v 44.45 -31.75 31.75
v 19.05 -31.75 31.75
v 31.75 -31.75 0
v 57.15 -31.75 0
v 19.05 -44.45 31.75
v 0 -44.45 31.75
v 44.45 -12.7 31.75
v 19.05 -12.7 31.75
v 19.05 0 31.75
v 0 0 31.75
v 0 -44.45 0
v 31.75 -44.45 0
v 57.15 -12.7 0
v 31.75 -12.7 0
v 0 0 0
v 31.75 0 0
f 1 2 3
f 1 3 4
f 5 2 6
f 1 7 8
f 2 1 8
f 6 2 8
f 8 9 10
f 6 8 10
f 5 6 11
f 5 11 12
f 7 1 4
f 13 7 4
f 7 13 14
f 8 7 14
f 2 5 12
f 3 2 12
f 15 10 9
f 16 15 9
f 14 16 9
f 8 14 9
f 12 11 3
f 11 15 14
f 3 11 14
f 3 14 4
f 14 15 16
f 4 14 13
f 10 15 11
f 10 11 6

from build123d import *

# Parameters (mm, degrees)
F0_W      = 57.15
F0_H      = 31.75
F1_DEPTH  = 44.45
F3_DEPTH  = 12.7
F5_DEPTH  = 12.7
F7_DEPTH  = 12.7
F9_DEPTH  = 12.7
F10_DEPTH = 6.35
F11_DEPTH = 6.35
F12_DEPTH = 25.4


with BuildPart() as f1:
    # F0 (on Front) → F1 (new body)
    with BuildSketch(Plane.XZ):
        with Locations((28.575, 15.875)):
            Rectangle(F0_W, F0_H)
    extrude(amount=F1_DEPTH)

    # F2 (on Front) → F3 (cut)
    with BuildSketch(Plane.XZ):
        Polygon((19.05, 31.75), (19.05, 0), (31.75, 0), align=None)
    extrude(amount=-F3_DEPTH, mode=Mode.SUBTRACT)

    # F4 (on face) → F5 (cut)
    with BuildSketch(Plane.XZ.offset(44.45)):
        Polygon((31.75, 0), (57.15, 0), (57.15, 31.75), (19.05, 31.75), align=None)
    extrude(amount=-F5_DEPTH, mode=Mode.SUBTRACT)

    # F6 (on face) → F7 (cut)
    with BuildSketch(Plane(origin=(0, 0, 0), x_dir=(-1, 0, 0), z_dir=(0, 1, 0))):
        Polygon((-57.15, 31.75), (-57.15, 0), (-31.75, 0), (-19.05, 31.75), align=None)
    extrude(amount=-F7_DEPTH, mode=Mode.SUBTRACT)

    # F8 (on face) → F9 (cut)
    with BuildSketch(Plane.XZ.offset(31.75)):
        Polygon((44.45, 31.75), (57.15, 0), (57.15, 31.75), align=None)
    extrude(amount=-F9_DEPTH, mode=Mode.SUBTRACT)

    # F10 (add): a face of the model
    f10_faces = [f1.faces().sort_by_distance(p)[0] for p in [
        (52.9166666667, -19.05, 21.1666666667),
    ]]
    extrude(f10_faces, amount=F10_DEPTH)

    # F11 (cut): a face of the model
    f11_faces = [f1.faces().sort_by_distance(p)[0] for p in [
        (52.9166666667, -25.4, 21.1666666667),
    ]]
    extrude(f11_faces, amount=-F11_DEPTH, mode=Mode.SUBTRACT)

    # F12 (cut): a face of the model
    f12_faces = [f1.faces().sort_by_distance(p)[0] for p in [
        (52.9166666667, -19.05, 21.1666666667),
    ]]
    extrude(f12_faces, amount=-F12_DEPTH, mode=Mode.SUBTRACT)


solid = f1.part
